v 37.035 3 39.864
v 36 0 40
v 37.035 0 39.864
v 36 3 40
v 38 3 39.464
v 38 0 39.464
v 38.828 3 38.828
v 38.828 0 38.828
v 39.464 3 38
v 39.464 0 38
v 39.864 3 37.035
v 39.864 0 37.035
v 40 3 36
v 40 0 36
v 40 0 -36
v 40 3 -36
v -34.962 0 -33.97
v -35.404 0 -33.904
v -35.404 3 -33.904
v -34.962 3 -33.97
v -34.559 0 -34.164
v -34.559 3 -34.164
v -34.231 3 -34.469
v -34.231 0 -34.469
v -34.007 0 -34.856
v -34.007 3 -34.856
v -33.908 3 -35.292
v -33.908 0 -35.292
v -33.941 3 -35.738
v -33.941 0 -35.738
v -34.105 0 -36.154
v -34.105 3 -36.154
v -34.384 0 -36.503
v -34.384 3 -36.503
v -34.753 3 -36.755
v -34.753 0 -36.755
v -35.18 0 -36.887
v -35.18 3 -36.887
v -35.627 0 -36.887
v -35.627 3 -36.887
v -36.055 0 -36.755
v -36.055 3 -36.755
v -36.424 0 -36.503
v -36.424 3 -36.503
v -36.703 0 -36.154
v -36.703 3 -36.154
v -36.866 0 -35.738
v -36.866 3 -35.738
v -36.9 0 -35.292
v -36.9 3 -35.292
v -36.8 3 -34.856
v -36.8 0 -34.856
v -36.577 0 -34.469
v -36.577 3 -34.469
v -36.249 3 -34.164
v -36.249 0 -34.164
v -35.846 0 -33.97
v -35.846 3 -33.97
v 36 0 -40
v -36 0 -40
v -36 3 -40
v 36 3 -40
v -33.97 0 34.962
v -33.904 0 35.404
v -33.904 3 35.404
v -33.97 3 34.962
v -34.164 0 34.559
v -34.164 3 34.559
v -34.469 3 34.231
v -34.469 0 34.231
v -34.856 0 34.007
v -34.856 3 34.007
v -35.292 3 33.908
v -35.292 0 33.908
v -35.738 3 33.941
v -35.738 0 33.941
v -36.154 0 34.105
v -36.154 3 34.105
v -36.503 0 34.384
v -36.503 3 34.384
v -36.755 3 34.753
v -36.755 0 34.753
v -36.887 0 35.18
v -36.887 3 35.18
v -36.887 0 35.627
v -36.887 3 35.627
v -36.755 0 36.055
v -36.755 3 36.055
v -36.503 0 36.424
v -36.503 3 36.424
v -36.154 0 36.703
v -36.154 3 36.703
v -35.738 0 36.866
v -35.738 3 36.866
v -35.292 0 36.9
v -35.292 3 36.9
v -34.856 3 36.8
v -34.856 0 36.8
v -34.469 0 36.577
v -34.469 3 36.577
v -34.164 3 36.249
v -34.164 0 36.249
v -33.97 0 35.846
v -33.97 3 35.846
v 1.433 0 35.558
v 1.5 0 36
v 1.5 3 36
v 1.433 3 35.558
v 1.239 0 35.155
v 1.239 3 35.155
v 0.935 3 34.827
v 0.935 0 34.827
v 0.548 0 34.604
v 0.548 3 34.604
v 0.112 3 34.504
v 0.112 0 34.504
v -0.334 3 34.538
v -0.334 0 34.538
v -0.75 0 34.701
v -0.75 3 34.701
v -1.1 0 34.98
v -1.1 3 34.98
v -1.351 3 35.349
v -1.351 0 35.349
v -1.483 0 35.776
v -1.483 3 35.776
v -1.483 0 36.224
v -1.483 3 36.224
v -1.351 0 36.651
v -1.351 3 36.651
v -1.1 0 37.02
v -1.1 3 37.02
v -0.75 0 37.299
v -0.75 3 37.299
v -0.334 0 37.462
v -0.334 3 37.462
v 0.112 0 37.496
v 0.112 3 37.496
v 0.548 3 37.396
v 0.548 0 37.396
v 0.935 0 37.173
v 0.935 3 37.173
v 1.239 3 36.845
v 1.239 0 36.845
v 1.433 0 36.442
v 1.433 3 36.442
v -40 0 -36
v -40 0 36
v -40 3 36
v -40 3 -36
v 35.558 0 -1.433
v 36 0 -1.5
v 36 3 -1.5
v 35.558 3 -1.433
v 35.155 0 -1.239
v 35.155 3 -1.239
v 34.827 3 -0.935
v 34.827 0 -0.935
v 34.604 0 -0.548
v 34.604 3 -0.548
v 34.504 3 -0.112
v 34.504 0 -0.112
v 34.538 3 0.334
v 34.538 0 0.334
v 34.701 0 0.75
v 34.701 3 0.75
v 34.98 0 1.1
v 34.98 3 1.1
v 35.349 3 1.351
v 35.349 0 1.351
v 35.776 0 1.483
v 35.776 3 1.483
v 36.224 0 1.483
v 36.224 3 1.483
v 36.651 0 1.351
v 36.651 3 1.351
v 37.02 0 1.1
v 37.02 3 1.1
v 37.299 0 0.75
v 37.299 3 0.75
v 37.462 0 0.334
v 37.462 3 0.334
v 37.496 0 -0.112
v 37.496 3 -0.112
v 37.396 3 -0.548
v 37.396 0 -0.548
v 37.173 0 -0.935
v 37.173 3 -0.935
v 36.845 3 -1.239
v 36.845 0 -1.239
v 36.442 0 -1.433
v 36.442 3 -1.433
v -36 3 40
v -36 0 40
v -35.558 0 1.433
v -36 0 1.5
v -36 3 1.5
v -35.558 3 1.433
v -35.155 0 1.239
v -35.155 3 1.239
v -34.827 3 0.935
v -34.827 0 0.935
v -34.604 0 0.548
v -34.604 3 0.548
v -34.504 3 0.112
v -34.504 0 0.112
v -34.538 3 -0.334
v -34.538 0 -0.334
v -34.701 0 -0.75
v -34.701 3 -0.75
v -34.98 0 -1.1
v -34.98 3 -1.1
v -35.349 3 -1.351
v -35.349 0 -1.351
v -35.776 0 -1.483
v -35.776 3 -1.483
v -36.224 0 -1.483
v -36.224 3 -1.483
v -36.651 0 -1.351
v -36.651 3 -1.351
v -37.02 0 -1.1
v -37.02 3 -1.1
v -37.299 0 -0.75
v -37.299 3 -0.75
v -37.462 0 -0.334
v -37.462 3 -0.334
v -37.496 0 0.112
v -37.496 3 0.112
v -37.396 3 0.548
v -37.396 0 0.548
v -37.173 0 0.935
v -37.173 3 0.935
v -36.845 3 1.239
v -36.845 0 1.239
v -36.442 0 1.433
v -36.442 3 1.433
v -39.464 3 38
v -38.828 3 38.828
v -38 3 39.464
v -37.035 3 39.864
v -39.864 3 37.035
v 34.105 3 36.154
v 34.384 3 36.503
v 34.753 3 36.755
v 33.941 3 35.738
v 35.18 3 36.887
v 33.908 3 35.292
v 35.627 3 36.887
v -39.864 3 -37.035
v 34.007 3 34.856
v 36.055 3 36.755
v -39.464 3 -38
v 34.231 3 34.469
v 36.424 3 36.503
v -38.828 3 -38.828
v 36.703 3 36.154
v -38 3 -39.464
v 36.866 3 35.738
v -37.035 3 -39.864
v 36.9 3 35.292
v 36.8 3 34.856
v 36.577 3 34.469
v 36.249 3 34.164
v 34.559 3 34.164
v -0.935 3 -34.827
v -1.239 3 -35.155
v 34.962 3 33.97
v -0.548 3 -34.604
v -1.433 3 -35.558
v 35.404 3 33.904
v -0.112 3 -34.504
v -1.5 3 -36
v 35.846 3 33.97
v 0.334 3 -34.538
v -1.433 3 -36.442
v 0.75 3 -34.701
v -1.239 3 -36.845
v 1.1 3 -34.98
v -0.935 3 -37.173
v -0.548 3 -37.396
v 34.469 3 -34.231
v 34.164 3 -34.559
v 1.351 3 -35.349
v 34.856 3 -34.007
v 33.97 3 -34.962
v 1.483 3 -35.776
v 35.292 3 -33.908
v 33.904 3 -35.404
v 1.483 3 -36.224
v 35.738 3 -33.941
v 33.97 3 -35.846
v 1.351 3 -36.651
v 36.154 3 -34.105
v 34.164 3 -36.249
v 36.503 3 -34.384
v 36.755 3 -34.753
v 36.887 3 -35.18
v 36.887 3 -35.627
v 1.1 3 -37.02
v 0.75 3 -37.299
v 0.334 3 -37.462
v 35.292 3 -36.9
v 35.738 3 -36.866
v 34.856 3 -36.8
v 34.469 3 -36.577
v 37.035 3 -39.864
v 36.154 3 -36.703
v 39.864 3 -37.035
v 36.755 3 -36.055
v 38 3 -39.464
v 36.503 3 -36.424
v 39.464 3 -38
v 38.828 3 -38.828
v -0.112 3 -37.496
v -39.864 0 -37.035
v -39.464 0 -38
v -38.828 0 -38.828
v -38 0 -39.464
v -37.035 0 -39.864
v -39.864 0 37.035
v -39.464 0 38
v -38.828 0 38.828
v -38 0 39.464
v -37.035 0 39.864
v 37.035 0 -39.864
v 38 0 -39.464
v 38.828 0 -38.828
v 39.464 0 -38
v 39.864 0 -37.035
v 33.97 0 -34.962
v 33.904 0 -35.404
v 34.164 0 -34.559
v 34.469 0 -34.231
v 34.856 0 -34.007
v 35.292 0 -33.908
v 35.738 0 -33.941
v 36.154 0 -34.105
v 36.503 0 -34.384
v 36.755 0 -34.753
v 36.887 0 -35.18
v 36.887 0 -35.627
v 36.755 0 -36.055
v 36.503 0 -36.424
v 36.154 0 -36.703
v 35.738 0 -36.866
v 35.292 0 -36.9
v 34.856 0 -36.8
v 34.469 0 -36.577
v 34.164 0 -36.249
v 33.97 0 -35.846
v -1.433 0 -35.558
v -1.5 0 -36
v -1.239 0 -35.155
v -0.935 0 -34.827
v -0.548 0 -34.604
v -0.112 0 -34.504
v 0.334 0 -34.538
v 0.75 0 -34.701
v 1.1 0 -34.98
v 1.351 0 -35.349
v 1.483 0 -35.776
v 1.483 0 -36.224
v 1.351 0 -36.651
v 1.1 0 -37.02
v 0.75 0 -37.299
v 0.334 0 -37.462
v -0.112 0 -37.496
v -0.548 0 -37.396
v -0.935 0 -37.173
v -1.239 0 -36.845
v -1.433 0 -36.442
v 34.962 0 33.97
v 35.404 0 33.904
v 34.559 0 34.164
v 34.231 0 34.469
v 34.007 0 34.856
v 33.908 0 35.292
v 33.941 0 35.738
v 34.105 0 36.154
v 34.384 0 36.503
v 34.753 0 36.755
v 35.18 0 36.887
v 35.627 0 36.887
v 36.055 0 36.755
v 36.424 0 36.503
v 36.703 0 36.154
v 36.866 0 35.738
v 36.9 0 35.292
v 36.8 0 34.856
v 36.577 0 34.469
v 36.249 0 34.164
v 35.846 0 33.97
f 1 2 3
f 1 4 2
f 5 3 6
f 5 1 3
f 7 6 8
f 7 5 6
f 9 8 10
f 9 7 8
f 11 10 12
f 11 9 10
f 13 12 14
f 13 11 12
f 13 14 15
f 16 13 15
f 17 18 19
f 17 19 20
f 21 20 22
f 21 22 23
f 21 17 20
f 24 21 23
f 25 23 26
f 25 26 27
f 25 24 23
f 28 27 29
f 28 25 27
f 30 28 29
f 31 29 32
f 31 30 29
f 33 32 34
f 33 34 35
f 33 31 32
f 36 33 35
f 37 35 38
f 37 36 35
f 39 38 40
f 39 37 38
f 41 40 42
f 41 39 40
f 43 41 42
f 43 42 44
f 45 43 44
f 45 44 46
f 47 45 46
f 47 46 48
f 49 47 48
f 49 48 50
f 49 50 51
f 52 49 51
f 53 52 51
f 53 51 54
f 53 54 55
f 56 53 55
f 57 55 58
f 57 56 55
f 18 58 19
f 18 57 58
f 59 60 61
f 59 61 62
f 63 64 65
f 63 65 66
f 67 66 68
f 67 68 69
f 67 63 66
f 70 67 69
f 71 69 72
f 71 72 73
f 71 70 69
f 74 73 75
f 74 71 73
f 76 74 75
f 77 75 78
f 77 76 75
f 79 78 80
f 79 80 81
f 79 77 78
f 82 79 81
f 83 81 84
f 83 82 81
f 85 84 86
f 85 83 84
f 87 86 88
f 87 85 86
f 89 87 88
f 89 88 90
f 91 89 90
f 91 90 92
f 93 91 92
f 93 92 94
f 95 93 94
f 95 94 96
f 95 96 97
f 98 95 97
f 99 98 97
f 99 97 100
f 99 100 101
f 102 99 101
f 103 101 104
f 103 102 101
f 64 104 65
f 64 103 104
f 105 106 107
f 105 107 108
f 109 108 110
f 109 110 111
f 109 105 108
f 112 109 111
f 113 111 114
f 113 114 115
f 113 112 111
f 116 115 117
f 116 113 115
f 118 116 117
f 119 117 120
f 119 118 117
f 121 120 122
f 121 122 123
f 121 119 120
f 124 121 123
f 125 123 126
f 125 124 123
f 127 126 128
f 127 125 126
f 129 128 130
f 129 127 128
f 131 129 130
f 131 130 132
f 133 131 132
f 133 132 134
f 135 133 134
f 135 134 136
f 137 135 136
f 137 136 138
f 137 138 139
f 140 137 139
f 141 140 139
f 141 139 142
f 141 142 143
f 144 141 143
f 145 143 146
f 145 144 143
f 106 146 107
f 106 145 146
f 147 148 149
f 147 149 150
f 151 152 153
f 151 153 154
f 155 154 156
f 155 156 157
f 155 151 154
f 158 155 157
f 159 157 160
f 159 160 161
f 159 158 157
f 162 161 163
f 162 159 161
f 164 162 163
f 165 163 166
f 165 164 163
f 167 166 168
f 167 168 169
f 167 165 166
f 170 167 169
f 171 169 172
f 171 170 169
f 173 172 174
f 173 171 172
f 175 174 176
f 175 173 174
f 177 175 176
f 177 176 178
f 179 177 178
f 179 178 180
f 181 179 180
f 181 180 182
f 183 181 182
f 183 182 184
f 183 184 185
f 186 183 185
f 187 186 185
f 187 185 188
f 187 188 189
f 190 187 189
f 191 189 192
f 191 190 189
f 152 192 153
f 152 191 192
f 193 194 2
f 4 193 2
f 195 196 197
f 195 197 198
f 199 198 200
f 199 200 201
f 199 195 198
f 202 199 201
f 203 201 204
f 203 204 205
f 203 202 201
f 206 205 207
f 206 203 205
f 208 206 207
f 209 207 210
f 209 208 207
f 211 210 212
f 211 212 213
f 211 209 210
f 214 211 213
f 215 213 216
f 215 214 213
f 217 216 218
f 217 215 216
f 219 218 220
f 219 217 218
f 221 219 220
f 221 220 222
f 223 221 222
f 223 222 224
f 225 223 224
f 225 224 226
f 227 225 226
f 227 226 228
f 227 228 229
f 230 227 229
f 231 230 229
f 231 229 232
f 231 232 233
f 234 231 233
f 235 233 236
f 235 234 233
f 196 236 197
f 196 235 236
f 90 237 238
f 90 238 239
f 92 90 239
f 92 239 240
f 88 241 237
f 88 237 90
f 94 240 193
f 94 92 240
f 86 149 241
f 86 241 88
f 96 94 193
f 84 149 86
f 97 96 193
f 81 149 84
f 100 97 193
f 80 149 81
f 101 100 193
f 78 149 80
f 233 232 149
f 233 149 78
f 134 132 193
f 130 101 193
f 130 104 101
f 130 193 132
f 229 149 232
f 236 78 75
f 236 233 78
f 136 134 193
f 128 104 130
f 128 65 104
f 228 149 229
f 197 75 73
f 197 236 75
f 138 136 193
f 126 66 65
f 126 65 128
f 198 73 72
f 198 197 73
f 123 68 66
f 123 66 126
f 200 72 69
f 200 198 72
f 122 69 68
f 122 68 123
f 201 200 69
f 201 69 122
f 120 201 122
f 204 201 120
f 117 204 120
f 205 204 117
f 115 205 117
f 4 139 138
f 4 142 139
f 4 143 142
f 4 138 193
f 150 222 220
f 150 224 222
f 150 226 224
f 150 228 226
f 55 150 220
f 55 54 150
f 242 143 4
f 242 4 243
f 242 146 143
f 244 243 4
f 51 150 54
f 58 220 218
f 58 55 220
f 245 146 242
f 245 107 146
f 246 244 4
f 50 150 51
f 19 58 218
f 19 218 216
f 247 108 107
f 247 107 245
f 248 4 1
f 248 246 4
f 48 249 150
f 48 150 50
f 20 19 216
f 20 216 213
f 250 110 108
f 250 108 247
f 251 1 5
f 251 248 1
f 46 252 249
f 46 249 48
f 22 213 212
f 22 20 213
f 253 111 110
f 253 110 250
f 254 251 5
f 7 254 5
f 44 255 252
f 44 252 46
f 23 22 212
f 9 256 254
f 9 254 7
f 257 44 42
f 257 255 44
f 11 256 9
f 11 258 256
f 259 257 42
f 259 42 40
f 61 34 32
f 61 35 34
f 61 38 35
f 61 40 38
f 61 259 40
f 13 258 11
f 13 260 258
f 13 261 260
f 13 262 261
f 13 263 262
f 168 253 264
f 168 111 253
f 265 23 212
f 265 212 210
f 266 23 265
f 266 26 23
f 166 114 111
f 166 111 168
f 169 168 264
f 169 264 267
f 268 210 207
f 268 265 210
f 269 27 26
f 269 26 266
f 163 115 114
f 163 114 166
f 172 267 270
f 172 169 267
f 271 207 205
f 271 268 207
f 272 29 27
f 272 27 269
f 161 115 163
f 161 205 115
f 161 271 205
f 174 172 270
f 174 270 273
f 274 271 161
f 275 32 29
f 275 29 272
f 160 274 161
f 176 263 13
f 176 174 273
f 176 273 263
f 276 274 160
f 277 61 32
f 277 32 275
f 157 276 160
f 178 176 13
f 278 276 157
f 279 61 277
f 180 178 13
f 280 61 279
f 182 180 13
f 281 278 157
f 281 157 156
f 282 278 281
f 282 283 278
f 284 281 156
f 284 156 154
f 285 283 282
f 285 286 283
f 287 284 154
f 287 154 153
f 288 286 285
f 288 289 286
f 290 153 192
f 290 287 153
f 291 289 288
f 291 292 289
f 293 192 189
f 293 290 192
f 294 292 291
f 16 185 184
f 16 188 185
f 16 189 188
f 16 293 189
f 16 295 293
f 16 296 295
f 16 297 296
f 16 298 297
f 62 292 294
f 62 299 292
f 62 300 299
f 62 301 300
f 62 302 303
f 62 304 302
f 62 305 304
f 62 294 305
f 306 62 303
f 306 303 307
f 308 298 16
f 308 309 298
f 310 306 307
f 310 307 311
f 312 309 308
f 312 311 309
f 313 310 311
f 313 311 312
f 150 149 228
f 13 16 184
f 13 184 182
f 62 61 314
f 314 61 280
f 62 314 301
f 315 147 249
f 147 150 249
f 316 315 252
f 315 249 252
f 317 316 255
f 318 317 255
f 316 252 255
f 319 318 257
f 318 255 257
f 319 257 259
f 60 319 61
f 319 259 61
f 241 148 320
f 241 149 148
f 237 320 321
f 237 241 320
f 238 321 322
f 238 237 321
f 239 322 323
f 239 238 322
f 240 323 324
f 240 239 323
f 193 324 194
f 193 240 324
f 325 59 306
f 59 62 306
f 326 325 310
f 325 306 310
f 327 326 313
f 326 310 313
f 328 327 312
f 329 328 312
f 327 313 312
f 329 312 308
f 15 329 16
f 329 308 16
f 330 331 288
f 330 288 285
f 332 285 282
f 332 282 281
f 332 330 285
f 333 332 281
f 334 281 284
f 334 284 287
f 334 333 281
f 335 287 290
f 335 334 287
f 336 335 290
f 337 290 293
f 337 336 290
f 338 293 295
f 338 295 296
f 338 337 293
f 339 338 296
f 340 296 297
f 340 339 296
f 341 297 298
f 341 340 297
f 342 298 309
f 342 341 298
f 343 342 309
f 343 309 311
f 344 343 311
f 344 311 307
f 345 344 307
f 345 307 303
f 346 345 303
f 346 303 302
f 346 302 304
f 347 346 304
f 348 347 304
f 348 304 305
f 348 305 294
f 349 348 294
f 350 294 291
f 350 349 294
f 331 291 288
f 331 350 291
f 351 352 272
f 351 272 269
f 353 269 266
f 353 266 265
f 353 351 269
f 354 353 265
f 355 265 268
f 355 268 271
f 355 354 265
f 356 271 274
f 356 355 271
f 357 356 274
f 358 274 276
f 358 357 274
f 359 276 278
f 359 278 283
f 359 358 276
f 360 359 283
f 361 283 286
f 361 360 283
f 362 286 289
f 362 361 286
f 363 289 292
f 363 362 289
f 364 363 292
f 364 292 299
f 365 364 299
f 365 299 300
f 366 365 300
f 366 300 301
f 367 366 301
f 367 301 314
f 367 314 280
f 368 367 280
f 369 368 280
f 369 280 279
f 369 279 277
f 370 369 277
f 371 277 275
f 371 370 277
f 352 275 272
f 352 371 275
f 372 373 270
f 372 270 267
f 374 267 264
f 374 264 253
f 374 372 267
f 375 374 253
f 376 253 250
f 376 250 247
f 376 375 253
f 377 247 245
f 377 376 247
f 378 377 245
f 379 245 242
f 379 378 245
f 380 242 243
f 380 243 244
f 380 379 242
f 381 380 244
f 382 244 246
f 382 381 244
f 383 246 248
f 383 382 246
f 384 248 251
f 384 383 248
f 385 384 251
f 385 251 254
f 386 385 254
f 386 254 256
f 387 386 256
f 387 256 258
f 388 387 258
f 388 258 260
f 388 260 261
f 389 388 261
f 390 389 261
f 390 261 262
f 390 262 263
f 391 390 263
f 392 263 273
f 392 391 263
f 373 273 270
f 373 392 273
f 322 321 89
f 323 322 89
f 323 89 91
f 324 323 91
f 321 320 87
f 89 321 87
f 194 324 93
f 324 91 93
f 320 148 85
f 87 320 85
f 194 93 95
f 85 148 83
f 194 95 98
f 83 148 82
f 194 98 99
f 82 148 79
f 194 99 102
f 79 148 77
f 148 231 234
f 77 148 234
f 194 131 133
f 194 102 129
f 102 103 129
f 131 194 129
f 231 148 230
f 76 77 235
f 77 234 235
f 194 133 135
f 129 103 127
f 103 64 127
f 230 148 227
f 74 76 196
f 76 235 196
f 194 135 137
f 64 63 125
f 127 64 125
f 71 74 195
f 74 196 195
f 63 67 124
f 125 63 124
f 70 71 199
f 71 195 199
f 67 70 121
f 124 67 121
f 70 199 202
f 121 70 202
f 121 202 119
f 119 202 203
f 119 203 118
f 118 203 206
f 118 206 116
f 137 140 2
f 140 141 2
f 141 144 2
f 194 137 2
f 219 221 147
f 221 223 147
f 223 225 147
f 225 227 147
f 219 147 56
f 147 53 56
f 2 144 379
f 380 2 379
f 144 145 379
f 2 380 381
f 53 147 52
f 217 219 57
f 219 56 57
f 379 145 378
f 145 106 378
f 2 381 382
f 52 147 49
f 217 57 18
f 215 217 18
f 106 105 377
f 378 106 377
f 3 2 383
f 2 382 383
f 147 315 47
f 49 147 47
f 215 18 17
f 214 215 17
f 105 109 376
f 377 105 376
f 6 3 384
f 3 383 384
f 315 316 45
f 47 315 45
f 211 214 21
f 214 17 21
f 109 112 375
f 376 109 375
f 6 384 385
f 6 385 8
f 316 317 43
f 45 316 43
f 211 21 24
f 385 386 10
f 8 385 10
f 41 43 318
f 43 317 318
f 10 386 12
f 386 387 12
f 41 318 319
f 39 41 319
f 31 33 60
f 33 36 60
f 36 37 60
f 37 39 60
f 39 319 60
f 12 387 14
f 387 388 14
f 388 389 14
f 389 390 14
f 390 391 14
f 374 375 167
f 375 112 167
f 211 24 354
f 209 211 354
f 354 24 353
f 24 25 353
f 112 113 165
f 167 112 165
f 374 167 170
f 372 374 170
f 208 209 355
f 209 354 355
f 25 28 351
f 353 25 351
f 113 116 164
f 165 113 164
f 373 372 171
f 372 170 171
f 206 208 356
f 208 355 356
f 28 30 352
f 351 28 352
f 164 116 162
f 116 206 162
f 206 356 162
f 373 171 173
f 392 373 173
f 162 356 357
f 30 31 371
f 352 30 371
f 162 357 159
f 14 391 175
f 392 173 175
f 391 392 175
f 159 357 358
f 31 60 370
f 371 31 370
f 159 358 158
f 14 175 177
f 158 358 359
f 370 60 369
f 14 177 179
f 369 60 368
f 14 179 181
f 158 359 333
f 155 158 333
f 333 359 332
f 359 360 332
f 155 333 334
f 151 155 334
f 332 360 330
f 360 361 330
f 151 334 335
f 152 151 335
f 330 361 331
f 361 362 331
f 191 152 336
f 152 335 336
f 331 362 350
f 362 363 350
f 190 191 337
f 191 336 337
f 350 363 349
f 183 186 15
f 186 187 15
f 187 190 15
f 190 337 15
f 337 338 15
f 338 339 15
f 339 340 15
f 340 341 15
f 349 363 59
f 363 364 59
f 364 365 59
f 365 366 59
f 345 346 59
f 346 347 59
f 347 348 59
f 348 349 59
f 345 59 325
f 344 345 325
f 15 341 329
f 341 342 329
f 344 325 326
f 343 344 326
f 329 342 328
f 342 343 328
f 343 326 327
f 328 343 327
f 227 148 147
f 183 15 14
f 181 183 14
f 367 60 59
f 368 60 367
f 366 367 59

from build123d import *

# Parameters (mm, degrees)
SKETCH_2_W               = 80
SKETCH_2_H               = 80
EXTRUDE_1_DEPTH          = 3
SKETCH_3_R               = 1.5
CUT_EXTRUDE_1_DEPTH      = 3
PATTERN_CIRCULAR_1_COUNT = 4
FILLET_1_R               = 4


with BuildPart() as part:
    # 草图2 → 凸台-拉伸1 (new body)
    with BuildSketch(Plane(origin=(0, 0, 0), x_dir=(1, 0, 0), z_dir=(0, 1, 0))):
        Rectangle(SKETCH_2_W, SKETCH_2_H)
    extrude(amount=EXTRUDE_1_DEPTH)

    # 草图3 → 切除-拉伸1 (cut)
    with BuildSketch(Plane(origin=(0, 0, 0), x_dir=(1, 0, 0), z_dir=(0, 1, 0))):
        with Locations((0, -36)):
            Circle(SKETCH_3_R)
        with Locations((-35.403805922, -35.403805922)):
            Circle(SKETCH_3_R)
    cut_extrude_1 = extrude(amount=CUT_EXTRUDE_1_DEPTH, mode=Mode.SUBTRACT)

    # 阵列(圆周)1: 切除-拉伸1 ×4 about axis
    pattern_circular_1_axis = Axis((0, 3.15, 0), (0, -1, 0))
    for i in range(1, PATTERN_CIRCULAR_1_COUNT):
        add(cut_extrude_1.rotate(pattern_circular_1_axis, i * 360 / PATTERN_CIRCULAR_1_COUNT), mode=Mode.SUBTRACT)

    # 圆角1
    fillet_1_edges = [part.edges().sort_by_distance(p)[0] for p in [
        (40, 1.5, -40),
        (40, 1.5, 40),
        (-40, 1.5, -40),
        (-40, 1.5, 40),
    ]]
    fillet(fillet_1_edges, radius=FILLET_1_R)


solid = part.part
